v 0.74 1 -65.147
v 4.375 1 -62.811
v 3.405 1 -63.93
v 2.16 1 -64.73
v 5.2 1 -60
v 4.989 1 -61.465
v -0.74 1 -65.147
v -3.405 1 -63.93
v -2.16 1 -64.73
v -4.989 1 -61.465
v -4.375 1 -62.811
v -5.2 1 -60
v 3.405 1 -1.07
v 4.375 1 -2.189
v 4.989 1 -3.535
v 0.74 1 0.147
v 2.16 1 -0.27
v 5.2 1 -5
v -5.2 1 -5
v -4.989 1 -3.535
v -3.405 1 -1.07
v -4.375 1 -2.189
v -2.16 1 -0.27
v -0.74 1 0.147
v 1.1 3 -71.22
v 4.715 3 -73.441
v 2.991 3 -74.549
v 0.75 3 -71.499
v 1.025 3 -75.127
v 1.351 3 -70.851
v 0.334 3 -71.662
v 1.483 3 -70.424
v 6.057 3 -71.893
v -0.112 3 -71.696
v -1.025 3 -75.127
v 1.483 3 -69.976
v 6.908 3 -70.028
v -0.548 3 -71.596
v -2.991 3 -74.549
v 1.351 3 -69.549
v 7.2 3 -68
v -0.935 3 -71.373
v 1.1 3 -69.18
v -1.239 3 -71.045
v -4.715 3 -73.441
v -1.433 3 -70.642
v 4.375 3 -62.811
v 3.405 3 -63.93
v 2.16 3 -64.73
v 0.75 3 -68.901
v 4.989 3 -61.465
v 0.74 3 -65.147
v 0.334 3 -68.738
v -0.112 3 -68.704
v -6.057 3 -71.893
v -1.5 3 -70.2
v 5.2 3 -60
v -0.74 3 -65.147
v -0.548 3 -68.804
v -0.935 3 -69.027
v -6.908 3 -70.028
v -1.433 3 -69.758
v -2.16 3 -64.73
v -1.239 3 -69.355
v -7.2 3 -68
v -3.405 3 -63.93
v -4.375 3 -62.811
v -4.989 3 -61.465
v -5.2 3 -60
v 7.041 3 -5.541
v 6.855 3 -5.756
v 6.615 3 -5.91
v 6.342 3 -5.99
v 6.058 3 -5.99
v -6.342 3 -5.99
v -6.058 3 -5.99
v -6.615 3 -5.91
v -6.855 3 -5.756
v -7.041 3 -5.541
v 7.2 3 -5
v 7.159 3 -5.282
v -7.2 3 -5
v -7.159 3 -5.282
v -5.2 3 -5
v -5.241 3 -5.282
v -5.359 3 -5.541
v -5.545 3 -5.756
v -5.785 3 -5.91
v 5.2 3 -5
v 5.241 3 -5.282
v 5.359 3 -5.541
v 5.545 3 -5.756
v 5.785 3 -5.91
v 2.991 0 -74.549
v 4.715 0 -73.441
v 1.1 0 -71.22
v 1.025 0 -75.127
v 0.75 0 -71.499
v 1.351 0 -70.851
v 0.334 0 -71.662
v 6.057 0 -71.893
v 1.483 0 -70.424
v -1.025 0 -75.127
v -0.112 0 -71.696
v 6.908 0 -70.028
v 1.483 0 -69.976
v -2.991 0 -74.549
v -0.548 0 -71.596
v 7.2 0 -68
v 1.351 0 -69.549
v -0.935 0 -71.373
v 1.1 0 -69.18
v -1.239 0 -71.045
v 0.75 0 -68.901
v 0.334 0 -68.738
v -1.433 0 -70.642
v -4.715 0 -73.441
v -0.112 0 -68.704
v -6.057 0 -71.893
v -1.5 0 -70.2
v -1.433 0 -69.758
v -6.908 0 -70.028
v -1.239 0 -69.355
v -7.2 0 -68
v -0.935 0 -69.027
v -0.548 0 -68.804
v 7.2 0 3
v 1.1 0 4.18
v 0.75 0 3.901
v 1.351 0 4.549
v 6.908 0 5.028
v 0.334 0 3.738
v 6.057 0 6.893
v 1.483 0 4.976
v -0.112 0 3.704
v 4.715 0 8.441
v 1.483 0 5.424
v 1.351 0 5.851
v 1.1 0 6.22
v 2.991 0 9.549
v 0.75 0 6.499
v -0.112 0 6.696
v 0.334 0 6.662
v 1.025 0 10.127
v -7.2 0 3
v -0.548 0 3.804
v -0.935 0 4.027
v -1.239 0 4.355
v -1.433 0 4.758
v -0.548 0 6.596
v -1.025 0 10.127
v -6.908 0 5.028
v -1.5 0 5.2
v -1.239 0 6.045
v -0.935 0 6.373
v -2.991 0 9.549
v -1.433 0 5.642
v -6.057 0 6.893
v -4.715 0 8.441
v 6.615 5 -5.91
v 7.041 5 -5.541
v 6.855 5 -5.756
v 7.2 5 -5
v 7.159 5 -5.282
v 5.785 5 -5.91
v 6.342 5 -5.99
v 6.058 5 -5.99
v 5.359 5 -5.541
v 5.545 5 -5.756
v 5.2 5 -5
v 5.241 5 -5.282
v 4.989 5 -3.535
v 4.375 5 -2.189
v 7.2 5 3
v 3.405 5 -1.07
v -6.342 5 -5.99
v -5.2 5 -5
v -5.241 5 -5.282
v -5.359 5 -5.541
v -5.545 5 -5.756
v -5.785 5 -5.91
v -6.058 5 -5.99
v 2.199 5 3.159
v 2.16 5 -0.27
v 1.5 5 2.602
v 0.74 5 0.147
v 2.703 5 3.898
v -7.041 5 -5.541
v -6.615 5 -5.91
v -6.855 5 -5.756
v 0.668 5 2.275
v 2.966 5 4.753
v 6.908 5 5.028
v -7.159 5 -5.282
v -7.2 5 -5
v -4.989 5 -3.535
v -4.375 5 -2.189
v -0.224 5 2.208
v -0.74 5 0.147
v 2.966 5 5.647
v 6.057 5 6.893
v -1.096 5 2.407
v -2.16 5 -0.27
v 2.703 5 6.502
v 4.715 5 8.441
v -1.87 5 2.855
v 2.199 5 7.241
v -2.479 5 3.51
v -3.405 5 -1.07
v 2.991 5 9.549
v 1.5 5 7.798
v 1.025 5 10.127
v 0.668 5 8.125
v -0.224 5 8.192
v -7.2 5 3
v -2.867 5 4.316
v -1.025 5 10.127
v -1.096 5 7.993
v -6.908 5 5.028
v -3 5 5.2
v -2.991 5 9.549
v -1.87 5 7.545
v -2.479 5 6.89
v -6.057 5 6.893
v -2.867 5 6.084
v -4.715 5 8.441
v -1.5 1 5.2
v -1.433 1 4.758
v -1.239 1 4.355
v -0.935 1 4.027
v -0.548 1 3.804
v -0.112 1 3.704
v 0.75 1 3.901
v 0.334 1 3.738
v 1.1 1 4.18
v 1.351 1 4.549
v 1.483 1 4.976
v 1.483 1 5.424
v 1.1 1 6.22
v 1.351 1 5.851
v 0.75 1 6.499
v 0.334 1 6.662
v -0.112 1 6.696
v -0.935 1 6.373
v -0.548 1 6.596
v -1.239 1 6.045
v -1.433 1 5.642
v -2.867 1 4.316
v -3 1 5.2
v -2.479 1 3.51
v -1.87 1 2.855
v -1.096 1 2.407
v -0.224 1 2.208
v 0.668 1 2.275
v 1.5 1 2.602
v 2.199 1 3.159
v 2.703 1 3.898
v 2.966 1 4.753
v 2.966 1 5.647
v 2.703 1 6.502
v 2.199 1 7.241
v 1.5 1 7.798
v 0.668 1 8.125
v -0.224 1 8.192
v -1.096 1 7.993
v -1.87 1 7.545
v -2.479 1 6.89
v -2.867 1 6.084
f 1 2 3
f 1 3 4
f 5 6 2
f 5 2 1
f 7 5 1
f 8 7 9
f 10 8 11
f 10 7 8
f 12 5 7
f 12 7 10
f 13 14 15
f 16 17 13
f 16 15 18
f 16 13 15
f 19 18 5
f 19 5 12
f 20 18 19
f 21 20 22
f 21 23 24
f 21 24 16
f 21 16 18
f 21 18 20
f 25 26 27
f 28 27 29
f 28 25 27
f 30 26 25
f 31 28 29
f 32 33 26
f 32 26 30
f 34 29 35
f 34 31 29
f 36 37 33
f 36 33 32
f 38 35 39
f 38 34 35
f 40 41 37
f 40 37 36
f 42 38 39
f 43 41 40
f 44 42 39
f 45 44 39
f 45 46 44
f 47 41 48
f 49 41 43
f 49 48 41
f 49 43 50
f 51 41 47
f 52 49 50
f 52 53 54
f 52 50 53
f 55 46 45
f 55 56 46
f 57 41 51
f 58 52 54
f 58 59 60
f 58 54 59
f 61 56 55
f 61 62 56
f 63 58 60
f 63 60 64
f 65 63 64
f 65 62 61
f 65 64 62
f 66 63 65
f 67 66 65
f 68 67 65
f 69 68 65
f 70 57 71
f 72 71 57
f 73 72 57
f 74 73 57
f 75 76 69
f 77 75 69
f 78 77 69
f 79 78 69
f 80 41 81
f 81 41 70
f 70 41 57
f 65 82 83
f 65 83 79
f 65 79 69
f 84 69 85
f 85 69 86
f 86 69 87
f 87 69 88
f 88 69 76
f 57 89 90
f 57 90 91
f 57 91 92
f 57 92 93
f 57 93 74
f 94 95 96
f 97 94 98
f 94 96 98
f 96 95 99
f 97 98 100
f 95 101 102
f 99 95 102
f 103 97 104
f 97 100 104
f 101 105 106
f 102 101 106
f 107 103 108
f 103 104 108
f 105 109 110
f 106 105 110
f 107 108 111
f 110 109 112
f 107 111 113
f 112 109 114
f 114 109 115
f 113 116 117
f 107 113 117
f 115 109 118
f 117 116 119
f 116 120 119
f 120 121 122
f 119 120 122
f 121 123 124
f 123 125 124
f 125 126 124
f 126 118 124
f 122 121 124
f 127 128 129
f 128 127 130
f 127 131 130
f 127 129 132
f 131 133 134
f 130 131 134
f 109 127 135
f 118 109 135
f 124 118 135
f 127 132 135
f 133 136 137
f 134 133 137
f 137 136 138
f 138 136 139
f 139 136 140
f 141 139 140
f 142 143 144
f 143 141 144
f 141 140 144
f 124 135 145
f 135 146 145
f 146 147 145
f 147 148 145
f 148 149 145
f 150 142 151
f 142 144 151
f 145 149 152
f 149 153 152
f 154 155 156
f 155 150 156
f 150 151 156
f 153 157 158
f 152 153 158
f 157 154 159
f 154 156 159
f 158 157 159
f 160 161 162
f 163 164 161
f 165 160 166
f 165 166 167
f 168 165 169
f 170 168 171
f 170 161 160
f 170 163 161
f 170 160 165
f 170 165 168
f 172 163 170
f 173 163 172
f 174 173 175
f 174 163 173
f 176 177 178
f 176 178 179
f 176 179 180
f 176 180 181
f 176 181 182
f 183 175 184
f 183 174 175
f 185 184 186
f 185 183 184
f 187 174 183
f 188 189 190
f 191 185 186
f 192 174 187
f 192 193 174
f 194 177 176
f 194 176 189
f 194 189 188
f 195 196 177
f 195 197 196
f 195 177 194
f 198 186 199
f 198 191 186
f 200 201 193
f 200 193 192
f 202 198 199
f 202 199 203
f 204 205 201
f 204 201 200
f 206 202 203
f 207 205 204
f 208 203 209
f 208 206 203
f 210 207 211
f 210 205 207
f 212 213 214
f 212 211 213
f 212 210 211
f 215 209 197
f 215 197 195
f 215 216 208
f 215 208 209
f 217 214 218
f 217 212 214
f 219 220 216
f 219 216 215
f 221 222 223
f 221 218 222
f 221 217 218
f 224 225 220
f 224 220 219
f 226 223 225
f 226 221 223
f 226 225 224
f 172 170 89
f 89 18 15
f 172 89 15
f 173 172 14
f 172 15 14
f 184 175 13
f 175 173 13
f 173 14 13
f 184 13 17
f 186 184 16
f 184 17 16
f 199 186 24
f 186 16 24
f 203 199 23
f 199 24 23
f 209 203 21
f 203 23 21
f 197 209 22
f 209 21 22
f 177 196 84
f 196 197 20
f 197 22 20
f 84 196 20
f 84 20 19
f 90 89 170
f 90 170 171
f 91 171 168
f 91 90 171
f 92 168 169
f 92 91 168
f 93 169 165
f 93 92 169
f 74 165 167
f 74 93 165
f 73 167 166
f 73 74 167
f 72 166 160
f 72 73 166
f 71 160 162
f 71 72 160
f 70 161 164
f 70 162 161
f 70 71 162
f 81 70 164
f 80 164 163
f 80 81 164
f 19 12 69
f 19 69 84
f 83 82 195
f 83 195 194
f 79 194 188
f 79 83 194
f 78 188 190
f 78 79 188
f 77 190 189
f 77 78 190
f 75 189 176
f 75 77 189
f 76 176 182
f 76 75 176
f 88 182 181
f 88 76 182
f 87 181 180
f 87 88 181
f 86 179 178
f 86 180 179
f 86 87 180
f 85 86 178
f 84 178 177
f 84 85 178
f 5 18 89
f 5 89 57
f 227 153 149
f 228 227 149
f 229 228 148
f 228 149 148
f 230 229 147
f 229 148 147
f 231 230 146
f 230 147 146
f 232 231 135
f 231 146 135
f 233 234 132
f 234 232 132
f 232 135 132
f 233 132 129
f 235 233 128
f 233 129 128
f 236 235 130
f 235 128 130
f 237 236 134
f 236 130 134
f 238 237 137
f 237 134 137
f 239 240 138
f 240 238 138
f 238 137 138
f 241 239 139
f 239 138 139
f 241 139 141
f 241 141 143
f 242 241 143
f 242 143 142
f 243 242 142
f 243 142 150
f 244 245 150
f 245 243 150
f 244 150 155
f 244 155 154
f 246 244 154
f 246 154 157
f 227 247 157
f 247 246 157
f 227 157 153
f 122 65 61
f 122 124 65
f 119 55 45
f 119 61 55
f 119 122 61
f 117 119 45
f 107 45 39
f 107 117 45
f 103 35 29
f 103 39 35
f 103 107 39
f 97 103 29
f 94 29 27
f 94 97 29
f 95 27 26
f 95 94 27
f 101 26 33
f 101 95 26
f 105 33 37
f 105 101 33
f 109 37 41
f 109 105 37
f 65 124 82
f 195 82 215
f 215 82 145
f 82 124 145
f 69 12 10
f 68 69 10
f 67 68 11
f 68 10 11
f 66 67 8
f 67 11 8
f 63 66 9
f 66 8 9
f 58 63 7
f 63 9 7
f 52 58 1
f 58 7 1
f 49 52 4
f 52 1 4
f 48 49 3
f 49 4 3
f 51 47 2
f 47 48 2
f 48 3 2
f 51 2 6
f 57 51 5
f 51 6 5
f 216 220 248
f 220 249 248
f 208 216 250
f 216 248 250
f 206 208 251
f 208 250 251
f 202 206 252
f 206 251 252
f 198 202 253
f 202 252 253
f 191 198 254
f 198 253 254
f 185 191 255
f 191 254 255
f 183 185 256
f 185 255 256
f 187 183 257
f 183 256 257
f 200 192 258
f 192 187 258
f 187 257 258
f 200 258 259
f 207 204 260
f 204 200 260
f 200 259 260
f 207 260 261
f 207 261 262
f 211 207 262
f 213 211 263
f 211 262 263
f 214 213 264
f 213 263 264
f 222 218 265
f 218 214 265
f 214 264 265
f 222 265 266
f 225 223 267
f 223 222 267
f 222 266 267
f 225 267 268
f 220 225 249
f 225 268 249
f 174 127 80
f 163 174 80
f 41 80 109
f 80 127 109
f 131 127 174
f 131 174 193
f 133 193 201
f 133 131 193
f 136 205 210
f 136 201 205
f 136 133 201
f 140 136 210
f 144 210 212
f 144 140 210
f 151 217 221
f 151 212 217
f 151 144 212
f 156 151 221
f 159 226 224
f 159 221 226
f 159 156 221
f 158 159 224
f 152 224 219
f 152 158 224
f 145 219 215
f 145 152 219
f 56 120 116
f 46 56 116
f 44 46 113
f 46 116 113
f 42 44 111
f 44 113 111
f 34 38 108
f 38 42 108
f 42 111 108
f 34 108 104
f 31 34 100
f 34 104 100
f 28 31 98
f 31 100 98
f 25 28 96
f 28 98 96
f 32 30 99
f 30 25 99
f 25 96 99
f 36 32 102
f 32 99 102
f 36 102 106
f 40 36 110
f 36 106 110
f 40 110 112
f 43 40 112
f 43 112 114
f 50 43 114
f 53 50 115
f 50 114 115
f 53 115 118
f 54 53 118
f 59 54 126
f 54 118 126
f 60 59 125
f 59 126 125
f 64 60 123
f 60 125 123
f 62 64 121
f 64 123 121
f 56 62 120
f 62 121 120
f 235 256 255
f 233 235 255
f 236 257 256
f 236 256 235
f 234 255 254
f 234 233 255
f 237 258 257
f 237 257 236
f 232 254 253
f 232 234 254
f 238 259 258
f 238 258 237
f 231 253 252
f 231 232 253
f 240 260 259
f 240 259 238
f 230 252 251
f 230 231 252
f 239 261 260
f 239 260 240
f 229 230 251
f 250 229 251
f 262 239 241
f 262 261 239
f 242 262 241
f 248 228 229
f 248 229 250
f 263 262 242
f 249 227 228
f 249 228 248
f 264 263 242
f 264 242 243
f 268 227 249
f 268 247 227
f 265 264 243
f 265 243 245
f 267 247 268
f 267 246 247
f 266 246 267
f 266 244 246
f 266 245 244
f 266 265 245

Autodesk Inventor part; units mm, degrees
ref_plane "YZ Plane" through (0, 0, 0) normal (1, 0, 0) x (0, 1, 0)
ref_plane "XZ Plane" through (0, 0, 0) normal (0, 1, 0) x (-1, 0, 0)
ref_plane "XY Plane" through (0, 0, 0) normal (0, 0, 1) x (1, 0, 0)
sketch "Sketch1" plane through (0, 0, 0) normal (0, 1, 0) x (-1, 0, 0)
  line L0 (0, 0) -> (0, -65) construction
  line L1 (-5, -5) -> (-5, -60) construction
  line L2 (5, -60) -> (5, -5) construction
  arc A0 (5, -5) -> (-5, -5) centre (0, -5) ccw construction
  arc A1 (-5, -60) -> (5, -60) centre (0, -60) ccw construction
  line L3 (5.2, -60) -> (5.2, -5)
  arc A2 (5.2, -5) -> (-5.2, -5) centre (0, -5) ccw
  line L4 (-5.2, -5) -> (-5.2, -60)
  arc A3 (-5.2, -60) -> (5.2, -60) centre (0, -60) ccw
  arc A4 (7.2, 3) -> (-7.2, 3) centre (0, 3) ccw
  line L5 (-7.2, 3) -> (-7.2, -68)
  arc A5 (-7.2, -68) -> (7.2, -68) centre (0, -68) ccw
  line L6 (7.2, -68) -> (7.2, 3)
  circle A6 centre (0, -70.2) radius 1.5
  line L7 (0, -75.2) -> (0, -65.2) construction
  circle A7 centre (0, 5.2) radius 1.5
  line L8 (0, 0.2) -> (0, 10.2) construction
  circle A8 centre (0, 5.2) radius 3
  arc A9 (-7.2, -5) -> (-5.2, -5) centre (-6.2, -5) ccw
  arc A10 (5.2, -5) -> (7.2, -5) centre (6.2, -5) ccw
  point P0 (0, -32.5)
  point P1 (7.2, -32.5)
  point P2 (0, -70.2)
  dimension "d0" = 65
  dimension "d1" = 10
  dimension "d2" = 0.2
  dimension "d8" = 2
  dimension "d9" = 2
  dimension "d10" = 10
  dimension "d11" = 10
  dimension "d12" = 3
  dimension "d13" = 3
  dimension "d14" = 6
extrude "Extrusion3" add sketch "Sketch1" along normal blind 1 contours A3 L4 A2 L3 | L3 A10 L6 A5 L5 A9 L4 A3 | A2 A9 L5 A4 L6 A10 | A8
extrude "Extrusion4" add sketch "Sketch1" along normal blind 2 from surface at 1 contours L3 A10 L6 A5 L5 A9 L4 A3 | A2 A9 L5 A4 L6 A10
extrude "Extrusion5" add sketch "Sketch1" along normal blind 2 from surface at 3 contours A2 A9 L5 A4 L6 A10
properties part number "magnet_holder"
